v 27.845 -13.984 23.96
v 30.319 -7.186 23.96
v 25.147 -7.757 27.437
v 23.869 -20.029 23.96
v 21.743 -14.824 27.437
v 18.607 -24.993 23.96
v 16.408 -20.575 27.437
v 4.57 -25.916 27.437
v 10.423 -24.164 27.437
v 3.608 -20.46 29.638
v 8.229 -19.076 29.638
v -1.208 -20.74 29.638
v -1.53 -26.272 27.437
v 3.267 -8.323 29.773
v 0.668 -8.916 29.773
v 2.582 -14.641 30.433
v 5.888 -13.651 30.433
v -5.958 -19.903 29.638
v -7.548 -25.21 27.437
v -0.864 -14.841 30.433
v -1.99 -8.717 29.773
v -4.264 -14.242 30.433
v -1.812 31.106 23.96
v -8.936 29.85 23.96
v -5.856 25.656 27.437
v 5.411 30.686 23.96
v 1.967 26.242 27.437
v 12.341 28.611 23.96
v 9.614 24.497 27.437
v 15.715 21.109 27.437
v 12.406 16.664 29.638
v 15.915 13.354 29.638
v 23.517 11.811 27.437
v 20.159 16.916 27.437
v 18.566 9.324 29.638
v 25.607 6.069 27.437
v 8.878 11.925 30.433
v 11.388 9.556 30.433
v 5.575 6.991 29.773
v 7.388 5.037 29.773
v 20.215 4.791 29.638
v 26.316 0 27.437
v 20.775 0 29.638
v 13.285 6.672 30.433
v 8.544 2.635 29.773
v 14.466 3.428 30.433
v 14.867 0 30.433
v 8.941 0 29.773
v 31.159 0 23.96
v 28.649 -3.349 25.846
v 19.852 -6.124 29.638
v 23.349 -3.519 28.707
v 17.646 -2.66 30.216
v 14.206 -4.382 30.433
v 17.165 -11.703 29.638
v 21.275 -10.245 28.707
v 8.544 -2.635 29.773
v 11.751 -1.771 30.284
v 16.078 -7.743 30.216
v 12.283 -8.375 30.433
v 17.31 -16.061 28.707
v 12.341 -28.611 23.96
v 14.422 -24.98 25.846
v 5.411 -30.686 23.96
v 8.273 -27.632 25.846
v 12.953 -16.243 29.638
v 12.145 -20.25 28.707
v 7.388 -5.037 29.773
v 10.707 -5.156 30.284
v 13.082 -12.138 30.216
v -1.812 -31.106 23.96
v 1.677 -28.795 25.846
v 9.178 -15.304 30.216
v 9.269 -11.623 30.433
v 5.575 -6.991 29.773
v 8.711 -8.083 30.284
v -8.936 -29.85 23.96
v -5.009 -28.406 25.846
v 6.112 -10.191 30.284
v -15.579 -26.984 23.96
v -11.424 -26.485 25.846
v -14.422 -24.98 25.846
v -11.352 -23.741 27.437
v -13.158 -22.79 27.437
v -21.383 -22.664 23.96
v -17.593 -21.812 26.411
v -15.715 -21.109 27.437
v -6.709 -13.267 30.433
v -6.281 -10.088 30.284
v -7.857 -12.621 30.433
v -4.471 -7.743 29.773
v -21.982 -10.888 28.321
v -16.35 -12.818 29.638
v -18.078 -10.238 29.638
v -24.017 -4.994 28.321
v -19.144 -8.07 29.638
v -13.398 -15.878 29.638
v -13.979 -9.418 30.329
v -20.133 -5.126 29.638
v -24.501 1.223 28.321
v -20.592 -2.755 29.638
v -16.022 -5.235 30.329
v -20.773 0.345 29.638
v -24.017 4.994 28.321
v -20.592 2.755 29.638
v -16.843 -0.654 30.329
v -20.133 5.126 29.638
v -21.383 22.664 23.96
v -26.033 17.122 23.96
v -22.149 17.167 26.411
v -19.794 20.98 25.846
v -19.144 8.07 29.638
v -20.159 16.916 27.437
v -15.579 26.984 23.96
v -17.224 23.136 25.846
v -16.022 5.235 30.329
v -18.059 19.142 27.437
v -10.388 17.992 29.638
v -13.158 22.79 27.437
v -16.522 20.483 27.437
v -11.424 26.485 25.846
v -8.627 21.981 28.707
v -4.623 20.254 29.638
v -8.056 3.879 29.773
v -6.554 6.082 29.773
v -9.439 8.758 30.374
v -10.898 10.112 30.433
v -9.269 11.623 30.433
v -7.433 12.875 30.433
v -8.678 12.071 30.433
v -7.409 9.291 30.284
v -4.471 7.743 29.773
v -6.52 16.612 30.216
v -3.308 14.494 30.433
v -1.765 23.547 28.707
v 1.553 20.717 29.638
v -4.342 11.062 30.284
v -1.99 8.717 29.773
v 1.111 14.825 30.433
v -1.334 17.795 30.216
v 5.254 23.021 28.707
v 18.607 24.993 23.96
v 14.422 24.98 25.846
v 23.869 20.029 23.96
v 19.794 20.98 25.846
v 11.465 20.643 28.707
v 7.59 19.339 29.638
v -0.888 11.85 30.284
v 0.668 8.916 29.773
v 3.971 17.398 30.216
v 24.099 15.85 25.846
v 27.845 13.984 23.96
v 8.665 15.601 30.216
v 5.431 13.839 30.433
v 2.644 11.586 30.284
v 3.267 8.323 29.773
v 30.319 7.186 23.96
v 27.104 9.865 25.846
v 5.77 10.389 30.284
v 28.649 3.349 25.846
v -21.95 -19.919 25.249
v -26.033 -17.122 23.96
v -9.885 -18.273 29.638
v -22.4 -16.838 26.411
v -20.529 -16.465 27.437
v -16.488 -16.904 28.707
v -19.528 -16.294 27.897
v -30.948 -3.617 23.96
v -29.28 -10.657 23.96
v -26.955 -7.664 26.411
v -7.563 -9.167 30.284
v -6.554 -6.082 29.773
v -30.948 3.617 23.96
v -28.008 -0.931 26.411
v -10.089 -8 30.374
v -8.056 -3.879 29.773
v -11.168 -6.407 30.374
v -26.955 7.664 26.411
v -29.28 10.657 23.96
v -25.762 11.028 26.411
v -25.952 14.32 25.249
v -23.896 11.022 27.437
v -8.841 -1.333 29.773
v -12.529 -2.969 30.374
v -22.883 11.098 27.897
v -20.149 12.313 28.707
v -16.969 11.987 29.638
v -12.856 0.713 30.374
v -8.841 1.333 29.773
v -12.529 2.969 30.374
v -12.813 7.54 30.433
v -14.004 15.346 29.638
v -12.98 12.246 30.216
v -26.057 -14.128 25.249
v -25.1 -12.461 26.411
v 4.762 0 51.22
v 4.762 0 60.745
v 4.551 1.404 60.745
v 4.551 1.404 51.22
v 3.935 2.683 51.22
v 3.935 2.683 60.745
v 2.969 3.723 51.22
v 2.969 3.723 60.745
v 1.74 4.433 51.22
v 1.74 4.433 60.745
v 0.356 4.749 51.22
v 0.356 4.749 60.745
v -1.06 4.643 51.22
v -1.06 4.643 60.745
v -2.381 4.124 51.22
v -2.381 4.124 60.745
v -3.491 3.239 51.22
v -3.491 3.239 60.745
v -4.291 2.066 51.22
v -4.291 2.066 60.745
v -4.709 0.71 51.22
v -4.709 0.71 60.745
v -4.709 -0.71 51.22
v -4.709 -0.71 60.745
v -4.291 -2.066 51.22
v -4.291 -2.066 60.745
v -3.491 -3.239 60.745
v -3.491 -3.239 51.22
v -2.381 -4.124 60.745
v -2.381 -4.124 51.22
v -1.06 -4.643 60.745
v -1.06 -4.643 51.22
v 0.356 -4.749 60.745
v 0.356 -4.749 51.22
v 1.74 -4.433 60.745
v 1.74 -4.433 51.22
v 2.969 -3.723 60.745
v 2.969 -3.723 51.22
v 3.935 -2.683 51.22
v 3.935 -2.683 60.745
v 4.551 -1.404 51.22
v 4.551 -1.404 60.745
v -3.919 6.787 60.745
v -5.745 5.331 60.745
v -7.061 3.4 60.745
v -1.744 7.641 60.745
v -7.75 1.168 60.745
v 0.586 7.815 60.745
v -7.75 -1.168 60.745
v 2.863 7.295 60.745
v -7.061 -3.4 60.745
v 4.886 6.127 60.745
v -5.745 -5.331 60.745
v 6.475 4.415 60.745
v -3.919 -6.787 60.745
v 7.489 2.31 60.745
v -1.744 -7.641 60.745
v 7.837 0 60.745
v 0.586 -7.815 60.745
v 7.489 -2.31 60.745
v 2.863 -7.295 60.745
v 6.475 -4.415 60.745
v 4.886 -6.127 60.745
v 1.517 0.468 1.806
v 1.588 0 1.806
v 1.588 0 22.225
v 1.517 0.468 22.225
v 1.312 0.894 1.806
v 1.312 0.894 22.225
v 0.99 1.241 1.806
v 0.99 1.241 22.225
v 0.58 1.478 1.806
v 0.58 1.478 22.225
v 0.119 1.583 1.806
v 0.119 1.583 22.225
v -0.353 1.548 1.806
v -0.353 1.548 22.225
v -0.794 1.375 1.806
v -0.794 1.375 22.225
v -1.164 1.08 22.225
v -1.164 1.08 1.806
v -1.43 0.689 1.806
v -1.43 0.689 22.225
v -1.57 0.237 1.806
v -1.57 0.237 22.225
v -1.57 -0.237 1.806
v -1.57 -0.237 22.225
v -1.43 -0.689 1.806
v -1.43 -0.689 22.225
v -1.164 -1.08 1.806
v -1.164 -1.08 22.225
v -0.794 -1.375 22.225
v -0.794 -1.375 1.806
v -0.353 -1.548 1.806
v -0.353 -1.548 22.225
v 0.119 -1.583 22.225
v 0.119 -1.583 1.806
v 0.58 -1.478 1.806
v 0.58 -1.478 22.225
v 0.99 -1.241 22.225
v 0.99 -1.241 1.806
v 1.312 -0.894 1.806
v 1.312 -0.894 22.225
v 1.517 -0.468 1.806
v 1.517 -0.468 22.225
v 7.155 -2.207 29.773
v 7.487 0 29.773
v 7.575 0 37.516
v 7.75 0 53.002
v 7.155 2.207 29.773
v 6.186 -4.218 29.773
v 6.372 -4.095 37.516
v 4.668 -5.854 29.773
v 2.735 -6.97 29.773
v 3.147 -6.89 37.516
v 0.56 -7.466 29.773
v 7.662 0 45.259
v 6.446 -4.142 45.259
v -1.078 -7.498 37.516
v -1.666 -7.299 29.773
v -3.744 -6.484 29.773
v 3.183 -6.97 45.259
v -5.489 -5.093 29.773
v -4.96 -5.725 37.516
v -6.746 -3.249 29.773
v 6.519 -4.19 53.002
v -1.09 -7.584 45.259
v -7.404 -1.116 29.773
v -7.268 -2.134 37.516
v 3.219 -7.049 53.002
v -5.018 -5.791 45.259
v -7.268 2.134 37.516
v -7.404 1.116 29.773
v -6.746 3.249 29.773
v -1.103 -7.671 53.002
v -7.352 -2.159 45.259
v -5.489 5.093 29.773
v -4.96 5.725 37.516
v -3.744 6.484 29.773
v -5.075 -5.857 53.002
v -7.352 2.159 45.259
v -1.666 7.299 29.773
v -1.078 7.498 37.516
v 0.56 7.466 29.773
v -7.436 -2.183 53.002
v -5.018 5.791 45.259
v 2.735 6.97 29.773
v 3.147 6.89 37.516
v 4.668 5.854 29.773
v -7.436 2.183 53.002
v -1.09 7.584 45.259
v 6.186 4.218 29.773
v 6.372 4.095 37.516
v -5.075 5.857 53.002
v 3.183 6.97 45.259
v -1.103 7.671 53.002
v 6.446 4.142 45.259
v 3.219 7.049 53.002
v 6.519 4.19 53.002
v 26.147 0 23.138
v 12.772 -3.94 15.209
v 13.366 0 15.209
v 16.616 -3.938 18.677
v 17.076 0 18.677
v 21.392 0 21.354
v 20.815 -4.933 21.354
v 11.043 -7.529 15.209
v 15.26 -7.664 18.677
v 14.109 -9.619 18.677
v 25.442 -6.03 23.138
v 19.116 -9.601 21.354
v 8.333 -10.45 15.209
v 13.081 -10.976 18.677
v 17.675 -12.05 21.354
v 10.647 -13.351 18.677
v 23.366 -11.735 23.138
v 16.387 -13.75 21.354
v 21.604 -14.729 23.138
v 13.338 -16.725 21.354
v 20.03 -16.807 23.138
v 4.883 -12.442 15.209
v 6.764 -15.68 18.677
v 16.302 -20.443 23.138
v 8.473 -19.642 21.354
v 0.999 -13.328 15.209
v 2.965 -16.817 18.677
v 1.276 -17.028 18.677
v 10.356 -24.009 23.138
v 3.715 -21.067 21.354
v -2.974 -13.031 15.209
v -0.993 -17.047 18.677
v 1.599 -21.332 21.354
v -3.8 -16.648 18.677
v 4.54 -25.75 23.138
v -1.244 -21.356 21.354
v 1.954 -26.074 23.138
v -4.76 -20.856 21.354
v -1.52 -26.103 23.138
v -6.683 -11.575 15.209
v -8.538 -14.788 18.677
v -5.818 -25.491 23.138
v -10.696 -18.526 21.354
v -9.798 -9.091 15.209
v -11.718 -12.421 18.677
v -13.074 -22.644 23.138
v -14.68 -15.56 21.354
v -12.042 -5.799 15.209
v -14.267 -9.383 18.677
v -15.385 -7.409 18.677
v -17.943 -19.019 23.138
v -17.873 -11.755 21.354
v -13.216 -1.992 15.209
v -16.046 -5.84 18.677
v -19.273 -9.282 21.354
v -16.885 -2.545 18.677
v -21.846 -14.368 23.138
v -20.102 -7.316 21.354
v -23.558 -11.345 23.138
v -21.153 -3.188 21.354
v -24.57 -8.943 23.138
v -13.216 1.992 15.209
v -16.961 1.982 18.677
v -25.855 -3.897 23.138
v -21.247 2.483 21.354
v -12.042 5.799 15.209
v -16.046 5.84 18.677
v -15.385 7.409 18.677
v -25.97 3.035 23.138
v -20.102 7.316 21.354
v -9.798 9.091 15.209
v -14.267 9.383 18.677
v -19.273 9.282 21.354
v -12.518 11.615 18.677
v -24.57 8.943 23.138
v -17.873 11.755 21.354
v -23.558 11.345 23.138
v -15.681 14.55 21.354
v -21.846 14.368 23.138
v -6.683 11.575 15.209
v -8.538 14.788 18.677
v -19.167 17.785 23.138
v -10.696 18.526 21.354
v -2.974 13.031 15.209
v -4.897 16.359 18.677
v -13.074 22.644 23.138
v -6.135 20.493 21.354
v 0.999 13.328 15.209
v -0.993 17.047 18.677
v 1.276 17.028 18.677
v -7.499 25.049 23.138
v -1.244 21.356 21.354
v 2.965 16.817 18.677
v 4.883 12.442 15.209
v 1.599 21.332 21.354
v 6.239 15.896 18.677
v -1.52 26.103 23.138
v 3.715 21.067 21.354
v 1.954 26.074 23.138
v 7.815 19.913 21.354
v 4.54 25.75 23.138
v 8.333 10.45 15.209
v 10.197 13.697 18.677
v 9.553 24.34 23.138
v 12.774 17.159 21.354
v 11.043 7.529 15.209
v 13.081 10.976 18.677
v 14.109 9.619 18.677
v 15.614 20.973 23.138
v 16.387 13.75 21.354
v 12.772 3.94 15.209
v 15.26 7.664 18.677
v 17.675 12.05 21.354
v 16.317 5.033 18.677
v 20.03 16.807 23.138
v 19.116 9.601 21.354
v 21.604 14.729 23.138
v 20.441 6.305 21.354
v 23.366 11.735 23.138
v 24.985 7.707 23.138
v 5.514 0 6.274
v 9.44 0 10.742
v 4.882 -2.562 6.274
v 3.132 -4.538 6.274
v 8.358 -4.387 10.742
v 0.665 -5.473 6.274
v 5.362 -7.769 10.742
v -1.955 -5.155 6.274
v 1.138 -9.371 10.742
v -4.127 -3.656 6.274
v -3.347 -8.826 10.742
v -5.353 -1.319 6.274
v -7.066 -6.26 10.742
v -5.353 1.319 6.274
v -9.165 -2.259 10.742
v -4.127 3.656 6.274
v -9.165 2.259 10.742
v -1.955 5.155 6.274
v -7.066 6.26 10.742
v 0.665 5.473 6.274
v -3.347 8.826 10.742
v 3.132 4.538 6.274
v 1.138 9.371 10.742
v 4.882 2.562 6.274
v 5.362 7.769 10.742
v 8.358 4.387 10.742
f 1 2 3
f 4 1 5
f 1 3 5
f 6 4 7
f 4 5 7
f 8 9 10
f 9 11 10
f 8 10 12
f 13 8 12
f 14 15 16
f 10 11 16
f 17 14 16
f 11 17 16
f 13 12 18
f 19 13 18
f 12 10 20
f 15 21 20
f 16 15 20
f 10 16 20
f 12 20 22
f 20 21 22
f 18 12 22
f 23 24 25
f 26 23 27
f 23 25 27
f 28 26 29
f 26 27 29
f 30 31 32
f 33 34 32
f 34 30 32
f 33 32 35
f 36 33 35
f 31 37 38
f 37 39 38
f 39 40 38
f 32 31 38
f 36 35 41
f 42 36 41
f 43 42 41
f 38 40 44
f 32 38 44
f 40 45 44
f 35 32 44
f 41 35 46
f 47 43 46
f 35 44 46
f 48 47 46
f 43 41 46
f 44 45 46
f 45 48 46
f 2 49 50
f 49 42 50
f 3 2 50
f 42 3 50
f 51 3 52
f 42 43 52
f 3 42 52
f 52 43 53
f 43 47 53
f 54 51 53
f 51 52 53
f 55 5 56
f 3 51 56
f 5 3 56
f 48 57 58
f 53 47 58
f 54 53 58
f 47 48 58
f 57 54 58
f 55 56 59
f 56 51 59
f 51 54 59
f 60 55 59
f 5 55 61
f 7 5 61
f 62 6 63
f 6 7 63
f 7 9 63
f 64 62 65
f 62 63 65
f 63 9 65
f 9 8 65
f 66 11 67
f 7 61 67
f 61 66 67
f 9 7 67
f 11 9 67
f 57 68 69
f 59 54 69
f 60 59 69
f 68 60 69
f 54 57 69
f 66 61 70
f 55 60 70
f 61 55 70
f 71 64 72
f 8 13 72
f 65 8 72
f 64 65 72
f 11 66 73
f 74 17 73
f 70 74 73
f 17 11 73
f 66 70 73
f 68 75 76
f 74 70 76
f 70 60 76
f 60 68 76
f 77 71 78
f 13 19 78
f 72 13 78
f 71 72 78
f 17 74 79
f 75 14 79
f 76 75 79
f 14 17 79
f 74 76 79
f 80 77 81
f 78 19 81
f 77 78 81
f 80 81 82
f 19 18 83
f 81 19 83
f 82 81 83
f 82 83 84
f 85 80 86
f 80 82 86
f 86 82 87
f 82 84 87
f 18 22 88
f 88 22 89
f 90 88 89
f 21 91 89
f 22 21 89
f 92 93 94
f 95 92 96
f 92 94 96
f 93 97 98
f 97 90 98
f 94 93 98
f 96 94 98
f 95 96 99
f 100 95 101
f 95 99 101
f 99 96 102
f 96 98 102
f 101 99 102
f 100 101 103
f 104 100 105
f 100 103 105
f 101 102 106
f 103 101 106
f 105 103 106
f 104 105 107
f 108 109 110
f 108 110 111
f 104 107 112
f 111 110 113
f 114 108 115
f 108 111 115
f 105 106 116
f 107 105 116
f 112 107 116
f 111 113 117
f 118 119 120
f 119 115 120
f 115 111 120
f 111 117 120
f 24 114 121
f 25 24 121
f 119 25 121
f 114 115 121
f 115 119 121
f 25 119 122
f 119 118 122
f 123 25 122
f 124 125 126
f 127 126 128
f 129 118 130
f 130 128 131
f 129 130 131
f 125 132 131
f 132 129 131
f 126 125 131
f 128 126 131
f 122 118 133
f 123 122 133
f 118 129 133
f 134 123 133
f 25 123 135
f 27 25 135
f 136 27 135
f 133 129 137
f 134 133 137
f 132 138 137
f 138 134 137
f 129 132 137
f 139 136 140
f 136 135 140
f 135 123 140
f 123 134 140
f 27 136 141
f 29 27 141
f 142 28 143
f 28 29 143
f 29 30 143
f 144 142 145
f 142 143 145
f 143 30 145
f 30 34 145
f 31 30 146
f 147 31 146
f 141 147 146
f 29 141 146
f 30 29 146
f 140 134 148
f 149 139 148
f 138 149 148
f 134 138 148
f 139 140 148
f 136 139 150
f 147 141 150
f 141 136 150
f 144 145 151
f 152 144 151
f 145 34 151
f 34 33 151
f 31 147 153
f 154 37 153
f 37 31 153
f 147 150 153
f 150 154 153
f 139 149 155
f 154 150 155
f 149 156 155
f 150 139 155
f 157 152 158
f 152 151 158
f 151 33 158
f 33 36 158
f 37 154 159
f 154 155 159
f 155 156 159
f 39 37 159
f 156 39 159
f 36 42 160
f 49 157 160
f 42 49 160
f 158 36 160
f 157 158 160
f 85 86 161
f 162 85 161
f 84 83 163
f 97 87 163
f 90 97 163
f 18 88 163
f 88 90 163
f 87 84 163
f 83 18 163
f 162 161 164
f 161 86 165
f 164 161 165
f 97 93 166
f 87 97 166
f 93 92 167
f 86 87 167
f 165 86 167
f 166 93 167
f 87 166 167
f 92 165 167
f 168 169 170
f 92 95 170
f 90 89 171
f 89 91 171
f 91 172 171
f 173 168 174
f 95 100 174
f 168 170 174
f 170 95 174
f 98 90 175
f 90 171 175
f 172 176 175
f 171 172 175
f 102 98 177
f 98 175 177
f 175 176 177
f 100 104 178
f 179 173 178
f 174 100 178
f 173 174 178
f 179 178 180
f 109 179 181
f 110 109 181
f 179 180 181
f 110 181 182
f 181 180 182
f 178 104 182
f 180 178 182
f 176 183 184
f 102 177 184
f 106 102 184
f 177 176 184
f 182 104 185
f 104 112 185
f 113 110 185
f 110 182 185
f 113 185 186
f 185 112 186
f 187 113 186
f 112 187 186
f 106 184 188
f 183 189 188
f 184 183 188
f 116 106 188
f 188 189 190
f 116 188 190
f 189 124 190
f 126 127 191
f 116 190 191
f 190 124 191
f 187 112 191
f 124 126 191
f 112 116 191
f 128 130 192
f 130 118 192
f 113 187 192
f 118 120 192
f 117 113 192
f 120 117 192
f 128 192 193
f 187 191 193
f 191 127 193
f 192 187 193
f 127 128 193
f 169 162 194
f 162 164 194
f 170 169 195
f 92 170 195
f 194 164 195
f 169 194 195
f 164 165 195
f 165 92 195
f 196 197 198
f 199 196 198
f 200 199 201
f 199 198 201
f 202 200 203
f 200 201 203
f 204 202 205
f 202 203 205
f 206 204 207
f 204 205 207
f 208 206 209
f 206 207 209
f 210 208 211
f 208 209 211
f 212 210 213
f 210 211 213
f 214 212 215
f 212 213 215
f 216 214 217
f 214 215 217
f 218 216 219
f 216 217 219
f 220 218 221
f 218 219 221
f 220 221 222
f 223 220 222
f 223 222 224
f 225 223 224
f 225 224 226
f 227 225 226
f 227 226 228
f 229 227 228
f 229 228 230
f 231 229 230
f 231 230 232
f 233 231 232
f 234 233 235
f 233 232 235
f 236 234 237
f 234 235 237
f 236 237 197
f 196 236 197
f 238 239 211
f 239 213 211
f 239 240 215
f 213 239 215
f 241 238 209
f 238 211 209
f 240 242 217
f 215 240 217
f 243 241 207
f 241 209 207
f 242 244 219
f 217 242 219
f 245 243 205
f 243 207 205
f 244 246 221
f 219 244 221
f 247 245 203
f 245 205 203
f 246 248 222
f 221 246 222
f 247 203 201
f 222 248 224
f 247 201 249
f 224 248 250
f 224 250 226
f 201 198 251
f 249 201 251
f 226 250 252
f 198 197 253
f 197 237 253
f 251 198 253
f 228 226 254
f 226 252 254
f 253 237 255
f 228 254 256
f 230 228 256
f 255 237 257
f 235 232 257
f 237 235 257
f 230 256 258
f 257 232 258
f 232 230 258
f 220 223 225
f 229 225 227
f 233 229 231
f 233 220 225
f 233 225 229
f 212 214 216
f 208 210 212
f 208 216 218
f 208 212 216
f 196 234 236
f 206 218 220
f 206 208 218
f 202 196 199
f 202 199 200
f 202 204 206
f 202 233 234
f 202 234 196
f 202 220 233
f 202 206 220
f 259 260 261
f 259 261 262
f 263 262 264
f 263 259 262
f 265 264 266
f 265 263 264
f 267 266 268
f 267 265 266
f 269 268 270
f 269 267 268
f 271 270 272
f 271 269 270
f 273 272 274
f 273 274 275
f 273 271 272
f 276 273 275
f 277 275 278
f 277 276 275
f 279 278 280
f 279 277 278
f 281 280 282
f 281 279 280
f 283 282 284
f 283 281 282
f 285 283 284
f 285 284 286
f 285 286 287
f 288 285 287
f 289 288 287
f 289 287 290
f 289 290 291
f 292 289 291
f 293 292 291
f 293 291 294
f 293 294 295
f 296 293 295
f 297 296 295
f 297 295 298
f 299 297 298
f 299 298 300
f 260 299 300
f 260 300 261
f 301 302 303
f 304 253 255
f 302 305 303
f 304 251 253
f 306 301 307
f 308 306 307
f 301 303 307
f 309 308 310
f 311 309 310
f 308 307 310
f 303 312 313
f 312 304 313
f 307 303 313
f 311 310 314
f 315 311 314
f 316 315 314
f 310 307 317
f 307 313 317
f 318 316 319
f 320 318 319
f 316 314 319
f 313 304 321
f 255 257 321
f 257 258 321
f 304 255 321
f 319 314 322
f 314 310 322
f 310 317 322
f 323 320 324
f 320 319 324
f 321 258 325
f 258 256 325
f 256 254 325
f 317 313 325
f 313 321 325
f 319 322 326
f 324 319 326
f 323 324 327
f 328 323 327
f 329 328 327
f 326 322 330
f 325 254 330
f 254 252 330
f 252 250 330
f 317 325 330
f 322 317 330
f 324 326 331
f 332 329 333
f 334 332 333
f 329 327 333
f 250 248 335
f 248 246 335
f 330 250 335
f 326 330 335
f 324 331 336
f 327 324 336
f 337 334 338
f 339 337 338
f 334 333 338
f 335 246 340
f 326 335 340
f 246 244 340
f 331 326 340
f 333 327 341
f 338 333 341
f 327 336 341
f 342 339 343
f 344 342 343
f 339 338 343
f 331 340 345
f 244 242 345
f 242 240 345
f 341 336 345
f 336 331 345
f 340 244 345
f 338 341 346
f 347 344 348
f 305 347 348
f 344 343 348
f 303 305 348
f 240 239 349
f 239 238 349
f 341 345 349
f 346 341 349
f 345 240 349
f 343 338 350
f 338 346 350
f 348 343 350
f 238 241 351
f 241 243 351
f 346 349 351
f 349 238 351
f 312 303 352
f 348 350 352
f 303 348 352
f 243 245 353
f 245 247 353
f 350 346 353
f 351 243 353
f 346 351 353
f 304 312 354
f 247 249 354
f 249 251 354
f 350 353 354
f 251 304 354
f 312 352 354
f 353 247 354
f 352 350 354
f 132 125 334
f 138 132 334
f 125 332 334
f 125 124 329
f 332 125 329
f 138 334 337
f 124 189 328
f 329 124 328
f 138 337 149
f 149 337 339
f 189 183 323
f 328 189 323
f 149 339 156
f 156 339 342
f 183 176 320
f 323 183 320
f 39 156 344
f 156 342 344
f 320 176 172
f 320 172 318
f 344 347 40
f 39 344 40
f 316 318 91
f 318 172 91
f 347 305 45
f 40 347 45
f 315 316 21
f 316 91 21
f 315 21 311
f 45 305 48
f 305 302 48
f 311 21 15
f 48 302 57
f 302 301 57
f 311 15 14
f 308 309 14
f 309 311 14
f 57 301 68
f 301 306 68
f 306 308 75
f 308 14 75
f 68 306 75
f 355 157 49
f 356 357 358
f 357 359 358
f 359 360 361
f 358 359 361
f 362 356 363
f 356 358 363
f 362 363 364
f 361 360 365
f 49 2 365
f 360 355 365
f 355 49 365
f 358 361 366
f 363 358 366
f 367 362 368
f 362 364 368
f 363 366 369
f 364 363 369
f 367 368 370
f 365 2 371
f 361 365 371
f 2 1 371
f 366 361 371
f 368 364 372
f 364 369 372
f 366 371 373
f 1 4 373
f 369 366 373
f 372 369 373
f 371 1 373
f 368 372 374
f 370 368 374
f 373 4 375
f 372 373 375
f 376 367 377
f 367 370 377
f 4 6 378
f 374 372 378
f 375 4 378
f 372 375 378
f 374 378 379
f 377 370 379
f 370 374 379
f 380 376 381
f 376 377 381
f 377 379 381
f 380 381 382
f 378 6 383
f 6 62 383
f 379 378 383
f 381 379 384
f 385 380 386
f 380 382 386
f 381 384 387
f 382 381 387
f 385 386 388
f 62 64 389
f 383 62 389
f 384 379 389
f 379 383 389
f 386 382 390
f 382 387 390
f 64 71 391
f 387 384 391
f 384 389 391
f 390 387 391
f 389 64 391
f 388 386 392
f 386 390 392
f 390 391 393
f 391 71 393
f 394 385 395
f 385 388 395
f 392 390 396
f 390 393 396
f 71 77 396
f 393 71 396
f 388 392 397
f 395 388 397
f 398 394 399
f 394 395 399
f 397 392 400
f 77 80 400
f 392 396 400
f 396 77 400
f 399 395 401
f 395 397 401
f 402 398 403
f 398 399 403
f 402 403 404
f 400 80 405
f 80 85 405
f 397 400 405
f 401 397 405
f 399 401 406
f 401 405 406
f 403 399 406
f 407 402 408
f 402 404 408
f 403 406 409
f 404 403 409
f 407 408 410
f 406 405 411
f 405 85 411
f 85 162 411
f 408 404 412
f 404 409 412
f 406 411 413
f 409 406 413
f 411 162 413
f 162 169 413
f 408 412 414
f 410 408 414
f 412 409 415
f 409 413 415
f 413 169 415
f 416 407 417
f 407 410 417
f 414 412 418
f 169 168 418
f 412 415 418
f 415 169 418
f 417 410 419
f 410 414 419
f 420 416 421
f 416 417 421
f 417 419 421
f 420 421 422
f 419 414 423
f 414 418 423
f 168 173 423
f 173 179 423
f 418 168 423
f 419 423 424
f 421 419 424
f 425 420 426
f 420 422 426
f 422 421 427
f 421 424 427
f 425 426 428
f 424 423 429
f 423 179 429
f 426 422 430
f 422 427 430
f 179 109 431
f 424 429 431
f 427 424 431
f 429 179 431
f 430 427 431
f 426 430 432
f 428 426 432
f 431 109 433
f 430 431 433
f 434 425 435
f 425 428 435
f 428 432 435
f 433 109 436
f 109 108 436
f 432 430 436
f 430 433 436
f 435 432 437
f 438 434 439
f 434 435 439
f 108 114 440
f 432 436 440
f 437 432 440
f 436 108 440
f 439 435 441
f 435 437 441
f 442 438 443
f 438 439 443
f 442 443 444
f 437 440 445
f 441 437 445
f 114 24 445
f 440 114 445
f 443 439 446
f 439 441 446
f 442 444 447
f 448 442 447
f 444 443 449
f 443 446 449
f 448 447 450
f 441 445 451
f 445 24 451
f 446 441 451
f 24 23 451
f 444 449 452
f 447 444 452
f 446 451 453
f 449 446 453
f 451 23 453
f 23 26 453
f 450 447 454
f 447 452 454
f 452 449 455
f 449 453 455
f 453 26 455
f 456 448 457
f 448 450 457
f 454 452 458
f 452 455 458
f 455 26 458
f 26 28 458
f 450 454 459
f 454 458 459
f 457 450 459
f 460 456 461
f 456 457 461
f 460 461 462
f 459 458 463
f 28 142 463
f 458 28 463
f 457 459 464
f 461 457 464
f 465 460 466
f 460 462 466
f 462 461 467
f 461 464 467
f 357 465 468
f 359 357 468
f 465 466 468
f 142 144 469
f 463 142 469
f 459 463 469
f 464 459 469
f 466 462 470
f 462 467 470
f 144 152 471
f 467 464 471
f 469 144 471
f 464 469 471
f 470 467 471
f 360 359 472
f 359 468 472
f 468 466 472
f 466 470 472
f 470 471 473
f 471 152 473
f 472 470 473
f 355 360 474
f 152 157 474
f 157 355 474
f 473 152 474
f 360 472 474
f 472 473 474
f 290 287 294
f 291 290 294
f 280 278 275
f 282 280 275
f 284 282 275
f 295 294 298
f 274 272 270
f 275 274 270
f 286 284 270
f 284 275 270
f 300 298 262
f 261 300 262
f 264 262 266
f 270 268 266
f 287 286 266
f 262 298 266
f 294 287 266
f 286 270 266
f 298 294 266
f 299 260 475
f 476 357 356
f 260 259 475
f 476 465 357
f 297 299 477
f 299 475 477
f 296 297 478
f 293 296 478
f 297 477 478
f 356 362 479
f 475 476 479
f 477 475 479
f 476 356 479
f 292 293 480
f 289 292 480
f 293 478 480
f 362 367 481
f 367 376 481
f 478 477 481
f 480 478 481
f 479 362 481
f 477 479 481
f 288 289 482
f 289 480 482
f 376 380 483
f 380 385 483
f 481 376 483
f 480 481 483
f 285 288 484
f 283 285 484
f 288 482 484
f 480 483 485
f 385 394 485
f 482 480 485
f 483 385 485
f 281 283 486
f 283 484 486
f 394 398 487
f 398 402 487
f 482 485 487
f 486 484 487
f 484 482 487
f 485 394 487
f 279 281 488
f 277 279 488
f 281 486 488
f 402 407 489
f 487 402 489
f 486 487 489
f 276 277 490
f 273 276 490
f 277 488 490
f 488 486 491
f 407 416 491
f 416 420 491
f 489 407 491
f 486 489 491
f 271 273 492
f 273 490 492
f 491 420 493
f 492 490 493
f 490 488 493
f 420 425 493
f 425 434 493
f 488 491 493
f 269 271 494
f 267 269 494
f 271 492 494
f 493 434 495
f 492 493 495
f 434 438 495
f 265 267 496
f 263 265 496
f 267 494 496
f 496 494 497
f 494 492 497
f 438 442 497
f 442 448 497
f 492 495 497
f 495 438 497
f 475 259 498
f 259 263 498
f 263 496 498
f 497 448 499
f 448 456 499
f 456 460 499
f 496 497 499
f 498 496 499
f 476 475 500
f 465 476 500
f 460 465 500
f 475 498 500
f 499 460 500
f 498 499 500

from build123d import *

# Parameters (mm, degrees)
F2_R     = 4.7625
F3_DEPTH = 9.525
F4_R     = 1.5875
F5_DEPTH = 22.225


with BuildPart() as f1:
    # F0 (on Front) → F1 (revolve)
    with BuildSketch(Plane.XZ):
        with BuildLine():
            Line((0, 60.744923), (0, 0))
            Line((0, 0), (13.365728, 15.209274))
            ThreePointArc((13.365728, 15.209274), (21.391858, 21.354408), (31.158879, 23.959541))
            ThreePointArc((31.158879, 23.959541), (20.775382, 29.638343), (8.941211, 29.773306))
            Line((8.941211, 29.773306), (7.487204, 29.773306))
            Line((7.487204, 29.773306), (7.837165, 60.744923))
            Line((7.837165, 60.744923), (0, 60.744923))
        make_face()
    revolve(axis=Axis((0, 0, 30.372461), (0, 0, -1)))

    # F2 (on face) → F3 (cut)
    with BuildSketch(Plane.XY.offset(60.744923)):
        Circle(F2_R)
    extrude(amount=-F3_DEPTH, mode=Mode.SUBTRACT)

    # F4 (on Top) → F5 (cut)
    with BuildSketch(Plane.XY):
        Circle(F4_R)
    extrude(amount=F5_DEPTH, mode=Mode.SUBTRACT)


solid = f1.part
